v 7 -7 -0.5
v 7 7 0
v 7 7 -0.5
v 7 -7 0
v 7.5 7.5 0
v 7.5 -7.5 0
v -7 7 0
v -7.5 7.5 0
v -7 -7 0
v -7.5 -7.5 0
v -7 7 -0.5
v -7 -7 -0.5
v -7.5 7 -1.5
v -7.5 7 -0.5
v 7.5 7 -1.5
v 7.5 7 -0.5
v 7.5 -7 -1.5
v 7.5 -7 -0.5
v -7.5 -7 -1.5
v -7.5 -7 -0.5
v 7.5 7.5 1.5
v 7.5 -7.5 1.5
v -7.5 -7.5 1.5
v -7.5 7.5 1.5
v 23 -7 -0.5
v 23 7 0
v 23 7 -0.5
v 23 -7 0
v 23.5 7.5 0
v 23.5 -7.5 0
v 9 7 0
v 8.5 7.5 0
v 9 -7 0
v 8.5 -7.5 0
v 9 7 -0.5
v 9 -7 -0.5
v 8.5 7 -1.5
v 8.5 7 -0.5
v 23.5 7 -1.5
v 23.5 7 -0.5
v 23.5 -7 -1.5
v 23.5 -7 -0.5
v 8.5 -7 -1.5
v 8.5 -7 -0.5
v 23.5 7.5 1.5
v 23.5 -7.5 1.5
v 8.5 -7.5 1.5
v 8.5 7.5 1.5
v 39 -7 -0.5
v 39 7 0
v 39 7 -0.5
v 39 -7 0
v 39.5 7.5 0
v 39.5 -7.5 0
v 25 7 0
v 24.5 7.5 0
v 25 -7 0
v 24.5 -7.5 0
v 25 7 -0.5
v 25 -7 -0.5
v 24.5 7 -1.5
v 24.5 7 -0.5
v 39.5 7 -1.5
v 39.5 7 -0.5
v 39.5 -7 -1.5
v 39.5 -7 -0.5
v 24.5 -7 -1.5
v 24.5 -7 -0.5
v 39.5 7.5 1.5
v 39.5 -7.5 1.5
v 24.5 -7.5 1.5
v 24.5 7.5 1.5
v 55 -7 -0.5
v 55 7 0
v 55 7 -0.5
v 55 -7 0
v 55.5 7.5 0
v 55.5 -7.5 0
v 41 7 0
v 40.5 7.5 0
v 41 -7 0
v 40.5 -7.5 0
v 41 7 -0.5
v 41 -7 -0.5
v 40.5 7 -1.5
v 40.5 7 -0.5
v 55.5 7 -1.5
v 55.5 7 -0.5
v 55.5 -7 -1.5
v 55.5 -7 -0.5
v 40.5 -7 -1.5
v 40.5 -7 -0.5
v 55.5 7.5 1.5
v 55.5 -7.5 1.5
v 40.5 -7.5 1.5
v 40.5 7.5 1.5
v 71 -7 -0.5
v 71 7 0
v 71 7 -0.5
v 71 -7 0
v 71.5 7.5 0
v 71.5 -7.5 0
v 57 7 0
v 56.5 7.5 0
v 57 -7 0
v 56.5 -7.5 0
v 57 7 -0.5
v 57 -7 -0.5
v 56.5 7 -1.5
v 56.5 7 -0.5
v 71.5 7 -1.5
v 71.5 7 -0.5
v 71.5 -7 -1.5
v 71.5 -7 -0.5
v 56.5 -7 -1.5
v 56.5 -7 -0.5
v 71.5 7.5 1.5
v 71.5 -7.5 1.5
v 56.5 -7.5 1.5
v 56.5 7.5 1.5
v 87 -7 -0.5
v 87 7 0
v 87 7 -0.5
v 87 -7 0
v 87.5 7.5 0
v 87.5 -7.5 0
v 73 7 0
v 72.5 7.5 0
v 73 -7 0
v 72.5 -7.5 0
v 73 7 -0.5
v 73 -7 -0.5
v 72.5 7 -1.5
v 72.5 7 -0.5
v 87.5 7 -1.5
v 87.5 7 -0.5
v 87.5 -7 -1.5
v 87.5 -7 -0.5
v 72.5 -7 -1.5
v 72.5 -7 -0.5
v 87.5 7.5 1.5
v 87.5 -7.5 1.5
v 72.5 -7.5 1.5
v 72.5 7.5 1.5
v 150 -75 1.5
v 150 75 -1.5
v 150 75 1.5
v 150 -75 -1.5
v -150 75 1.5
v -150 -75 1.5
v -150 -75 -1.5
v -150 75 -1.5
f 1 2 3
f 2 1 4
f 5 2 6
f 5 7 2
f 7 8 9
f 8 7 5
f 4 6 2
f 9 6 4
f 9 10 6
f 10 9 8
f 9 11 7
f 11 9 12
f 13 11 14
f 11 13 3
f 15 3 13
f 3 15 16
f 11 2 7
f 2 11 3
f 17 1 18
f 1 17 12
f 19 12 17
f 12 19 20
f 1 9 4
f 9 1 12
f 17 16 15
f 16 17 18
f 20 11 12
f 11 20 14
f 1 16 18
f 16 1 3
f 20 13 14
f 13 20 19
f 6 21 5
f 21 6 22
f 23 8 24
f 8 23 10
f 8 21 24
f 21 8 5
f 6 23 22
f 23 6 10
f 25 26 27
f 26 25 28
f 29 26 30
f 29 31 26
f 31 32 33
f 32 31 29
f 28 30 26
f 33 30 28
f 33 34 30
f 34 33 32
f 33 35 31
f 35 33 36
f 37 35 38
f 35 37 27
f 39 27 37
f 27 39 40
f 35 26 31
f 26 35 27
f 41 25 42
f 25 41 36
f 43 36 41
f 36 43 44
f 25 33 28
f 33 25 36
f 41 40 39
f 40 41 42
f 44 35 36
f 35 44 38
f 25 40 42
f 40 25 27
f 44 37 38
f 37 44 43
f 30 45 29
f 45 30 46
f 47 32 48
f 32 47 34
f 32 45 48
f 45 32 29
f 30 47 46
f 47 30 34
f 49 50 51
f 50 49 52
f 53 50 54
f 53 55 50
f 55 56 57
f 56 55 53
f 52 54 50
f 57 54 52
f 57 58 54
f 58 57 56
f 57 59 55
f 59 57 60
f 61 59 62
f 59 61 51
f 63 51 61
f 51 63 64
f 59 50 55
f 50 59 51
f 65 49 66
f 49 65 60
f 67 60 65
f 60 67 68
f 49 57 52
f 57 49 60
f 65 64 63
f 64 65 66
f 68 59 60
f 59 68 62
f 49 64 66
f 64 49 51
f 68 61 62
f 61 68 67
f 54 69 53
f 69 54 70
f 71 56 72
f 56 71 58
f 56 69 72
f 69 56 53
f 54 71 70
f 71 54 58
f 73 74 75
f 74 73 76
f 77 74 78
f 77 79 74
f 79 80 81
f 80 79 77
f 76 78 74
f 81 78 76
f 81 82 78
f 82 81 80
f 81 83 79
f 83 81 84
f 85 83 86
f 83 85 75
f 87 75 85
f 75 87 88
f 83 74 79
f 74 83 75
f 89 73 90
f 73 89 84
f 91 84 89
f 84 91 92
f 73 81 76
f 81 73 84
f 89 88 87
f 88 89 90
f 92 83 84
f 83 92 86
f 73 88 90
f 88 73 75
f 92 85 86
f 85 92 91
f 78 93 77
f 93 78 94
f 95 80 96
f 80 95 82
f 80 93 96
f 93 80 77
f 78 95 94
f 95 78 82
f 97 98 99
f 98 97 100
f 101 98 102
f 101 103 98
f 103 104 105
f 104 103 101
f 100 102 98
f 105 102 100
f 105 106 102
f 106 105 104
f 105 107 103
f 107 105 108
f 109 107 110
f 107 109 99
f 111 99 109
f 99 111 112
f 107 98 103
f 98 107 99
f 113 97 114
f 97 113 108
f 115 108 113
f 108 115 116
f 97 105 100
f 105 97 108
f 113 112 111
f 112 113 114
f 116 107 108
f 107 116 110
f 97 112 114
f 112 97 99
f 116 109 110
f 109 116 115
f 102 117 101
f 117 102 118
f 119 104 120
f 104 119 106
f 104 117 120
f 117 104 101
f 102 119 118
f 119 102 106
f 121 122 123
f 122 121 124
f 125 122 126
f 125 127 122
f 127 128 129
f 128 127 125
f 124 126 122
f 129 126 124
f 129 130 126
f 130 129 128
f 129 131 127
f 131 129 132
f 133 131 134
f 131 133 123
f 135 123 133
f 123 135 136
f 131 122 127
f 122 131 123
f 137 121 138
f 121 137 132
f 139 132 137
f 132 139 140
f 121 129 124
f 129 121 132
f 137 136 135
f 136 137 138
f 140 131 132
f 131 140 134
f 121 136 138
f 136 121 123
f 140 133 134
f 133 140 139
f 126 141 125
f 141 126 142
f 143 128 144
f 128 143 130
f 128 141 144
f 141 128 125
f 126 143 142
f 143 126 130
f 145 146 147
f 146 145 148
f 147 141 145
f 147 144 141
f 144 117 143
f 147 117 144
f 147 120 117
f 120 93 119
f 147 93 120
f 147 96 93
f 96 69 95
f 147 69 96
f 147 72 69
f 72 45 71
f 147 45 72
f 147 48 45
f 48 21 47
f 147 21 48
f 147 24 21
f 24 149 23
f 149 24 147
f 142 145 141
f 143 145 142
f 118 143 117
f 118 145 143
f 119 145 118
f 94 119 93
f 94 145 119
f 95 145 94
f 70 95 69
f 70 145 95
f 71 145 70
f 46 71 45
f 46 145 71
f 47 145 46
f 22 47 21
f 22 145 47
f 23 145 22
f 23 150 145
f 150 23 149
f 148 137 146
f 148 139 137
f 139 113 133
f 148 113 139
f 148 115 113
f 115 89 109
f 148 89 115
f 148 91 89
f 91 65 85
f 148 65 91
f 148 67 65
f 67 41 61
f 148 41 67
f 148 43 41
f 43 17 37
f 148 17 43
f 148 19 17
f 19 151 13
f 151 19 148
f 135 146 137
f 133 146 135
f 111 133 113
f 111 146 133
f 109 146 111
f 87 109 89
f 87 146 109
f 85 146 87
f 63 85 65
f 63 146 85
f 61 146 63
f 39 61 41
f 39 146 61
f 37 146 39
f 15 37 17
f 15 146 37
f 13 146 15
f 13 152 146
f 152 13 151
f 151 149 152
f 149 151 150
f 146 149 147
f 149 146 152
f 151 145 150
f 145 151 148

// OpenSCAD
difference () {
  cube ([300, 150, 3], center=true);
  union () {
    translate ([0, 0, 0]) {
      union () {
        translate ([0, 0, -0.5]) {
          cube ([14, 14, 1], center=true);
        }
        translate ([0, 0, -3]) {
          cube ([15, 14, 5], center=true);
        }
        translate ([0, 0, 5]) {
          cube ([15, 15, 10], center=true);
        }
      }
    }
    translate ([16, 0, 0]) {
      union () {
        translate ([0, 0, -0.5]) {
          cube ([14, 14, 1], center=true);
        }
        translate ([0, 0, -3]) {
          cube ([15, 14, 5], center=true);
        }
        translate ([0, 0, 5]) {
          cube ([15, 15, 10], center=true);
        }
      }
    }
    translate ([32, 0, 0]) {
      union () {
        translate ([0, 0, -0.5]) {
          cube ([14, 14, 1], center=true);
        }
        translate ([0, 0, -3]) {
          cube ([15, 14, 5], center=true);
        }
        translate ([0, 0, 5]) {
          cube ([15, 15, 10], center=true);
        }
      }
    }
    translate ([48, 0, 0]) {
      union () {
        translate ([0, 0, -0.5]) {
          cube ([14, 14, 1], center=true);
        }
        translate ([0, 0, -3]) {
          cube ([15, 14, 5], center=true);
        }
        translate ([0, 0, 5]) {
          cube ([15, 15, 10], center=true);
        }
      }
    }
    translate ([64, 0, 0]) {
      union () {
        translate ([0, 0, -0.5]) {
          cube ([14, 14, 1], center=true);
        }
        translate ([0, 0, -3]) {
          cube ([15, 14, 5], center=true);
        }
        translate ([0, 0, 5]) {
          cube ([15, 15, 10], center=true);
        }
      }
    }
    translate ([80, 0, 0]) {
      union () {
        translate ([0, 0, -0.5]) {
          cube ([14, 14, 1], center=true);
        }
        translate ([0, 0, -3]) {
          cube ([15, 14, 5], center=true);
        }
        translate ([0, 0, 5]) {
          cube ([15, 15, 10], center=true);
        }
      }
    }
  }
}
